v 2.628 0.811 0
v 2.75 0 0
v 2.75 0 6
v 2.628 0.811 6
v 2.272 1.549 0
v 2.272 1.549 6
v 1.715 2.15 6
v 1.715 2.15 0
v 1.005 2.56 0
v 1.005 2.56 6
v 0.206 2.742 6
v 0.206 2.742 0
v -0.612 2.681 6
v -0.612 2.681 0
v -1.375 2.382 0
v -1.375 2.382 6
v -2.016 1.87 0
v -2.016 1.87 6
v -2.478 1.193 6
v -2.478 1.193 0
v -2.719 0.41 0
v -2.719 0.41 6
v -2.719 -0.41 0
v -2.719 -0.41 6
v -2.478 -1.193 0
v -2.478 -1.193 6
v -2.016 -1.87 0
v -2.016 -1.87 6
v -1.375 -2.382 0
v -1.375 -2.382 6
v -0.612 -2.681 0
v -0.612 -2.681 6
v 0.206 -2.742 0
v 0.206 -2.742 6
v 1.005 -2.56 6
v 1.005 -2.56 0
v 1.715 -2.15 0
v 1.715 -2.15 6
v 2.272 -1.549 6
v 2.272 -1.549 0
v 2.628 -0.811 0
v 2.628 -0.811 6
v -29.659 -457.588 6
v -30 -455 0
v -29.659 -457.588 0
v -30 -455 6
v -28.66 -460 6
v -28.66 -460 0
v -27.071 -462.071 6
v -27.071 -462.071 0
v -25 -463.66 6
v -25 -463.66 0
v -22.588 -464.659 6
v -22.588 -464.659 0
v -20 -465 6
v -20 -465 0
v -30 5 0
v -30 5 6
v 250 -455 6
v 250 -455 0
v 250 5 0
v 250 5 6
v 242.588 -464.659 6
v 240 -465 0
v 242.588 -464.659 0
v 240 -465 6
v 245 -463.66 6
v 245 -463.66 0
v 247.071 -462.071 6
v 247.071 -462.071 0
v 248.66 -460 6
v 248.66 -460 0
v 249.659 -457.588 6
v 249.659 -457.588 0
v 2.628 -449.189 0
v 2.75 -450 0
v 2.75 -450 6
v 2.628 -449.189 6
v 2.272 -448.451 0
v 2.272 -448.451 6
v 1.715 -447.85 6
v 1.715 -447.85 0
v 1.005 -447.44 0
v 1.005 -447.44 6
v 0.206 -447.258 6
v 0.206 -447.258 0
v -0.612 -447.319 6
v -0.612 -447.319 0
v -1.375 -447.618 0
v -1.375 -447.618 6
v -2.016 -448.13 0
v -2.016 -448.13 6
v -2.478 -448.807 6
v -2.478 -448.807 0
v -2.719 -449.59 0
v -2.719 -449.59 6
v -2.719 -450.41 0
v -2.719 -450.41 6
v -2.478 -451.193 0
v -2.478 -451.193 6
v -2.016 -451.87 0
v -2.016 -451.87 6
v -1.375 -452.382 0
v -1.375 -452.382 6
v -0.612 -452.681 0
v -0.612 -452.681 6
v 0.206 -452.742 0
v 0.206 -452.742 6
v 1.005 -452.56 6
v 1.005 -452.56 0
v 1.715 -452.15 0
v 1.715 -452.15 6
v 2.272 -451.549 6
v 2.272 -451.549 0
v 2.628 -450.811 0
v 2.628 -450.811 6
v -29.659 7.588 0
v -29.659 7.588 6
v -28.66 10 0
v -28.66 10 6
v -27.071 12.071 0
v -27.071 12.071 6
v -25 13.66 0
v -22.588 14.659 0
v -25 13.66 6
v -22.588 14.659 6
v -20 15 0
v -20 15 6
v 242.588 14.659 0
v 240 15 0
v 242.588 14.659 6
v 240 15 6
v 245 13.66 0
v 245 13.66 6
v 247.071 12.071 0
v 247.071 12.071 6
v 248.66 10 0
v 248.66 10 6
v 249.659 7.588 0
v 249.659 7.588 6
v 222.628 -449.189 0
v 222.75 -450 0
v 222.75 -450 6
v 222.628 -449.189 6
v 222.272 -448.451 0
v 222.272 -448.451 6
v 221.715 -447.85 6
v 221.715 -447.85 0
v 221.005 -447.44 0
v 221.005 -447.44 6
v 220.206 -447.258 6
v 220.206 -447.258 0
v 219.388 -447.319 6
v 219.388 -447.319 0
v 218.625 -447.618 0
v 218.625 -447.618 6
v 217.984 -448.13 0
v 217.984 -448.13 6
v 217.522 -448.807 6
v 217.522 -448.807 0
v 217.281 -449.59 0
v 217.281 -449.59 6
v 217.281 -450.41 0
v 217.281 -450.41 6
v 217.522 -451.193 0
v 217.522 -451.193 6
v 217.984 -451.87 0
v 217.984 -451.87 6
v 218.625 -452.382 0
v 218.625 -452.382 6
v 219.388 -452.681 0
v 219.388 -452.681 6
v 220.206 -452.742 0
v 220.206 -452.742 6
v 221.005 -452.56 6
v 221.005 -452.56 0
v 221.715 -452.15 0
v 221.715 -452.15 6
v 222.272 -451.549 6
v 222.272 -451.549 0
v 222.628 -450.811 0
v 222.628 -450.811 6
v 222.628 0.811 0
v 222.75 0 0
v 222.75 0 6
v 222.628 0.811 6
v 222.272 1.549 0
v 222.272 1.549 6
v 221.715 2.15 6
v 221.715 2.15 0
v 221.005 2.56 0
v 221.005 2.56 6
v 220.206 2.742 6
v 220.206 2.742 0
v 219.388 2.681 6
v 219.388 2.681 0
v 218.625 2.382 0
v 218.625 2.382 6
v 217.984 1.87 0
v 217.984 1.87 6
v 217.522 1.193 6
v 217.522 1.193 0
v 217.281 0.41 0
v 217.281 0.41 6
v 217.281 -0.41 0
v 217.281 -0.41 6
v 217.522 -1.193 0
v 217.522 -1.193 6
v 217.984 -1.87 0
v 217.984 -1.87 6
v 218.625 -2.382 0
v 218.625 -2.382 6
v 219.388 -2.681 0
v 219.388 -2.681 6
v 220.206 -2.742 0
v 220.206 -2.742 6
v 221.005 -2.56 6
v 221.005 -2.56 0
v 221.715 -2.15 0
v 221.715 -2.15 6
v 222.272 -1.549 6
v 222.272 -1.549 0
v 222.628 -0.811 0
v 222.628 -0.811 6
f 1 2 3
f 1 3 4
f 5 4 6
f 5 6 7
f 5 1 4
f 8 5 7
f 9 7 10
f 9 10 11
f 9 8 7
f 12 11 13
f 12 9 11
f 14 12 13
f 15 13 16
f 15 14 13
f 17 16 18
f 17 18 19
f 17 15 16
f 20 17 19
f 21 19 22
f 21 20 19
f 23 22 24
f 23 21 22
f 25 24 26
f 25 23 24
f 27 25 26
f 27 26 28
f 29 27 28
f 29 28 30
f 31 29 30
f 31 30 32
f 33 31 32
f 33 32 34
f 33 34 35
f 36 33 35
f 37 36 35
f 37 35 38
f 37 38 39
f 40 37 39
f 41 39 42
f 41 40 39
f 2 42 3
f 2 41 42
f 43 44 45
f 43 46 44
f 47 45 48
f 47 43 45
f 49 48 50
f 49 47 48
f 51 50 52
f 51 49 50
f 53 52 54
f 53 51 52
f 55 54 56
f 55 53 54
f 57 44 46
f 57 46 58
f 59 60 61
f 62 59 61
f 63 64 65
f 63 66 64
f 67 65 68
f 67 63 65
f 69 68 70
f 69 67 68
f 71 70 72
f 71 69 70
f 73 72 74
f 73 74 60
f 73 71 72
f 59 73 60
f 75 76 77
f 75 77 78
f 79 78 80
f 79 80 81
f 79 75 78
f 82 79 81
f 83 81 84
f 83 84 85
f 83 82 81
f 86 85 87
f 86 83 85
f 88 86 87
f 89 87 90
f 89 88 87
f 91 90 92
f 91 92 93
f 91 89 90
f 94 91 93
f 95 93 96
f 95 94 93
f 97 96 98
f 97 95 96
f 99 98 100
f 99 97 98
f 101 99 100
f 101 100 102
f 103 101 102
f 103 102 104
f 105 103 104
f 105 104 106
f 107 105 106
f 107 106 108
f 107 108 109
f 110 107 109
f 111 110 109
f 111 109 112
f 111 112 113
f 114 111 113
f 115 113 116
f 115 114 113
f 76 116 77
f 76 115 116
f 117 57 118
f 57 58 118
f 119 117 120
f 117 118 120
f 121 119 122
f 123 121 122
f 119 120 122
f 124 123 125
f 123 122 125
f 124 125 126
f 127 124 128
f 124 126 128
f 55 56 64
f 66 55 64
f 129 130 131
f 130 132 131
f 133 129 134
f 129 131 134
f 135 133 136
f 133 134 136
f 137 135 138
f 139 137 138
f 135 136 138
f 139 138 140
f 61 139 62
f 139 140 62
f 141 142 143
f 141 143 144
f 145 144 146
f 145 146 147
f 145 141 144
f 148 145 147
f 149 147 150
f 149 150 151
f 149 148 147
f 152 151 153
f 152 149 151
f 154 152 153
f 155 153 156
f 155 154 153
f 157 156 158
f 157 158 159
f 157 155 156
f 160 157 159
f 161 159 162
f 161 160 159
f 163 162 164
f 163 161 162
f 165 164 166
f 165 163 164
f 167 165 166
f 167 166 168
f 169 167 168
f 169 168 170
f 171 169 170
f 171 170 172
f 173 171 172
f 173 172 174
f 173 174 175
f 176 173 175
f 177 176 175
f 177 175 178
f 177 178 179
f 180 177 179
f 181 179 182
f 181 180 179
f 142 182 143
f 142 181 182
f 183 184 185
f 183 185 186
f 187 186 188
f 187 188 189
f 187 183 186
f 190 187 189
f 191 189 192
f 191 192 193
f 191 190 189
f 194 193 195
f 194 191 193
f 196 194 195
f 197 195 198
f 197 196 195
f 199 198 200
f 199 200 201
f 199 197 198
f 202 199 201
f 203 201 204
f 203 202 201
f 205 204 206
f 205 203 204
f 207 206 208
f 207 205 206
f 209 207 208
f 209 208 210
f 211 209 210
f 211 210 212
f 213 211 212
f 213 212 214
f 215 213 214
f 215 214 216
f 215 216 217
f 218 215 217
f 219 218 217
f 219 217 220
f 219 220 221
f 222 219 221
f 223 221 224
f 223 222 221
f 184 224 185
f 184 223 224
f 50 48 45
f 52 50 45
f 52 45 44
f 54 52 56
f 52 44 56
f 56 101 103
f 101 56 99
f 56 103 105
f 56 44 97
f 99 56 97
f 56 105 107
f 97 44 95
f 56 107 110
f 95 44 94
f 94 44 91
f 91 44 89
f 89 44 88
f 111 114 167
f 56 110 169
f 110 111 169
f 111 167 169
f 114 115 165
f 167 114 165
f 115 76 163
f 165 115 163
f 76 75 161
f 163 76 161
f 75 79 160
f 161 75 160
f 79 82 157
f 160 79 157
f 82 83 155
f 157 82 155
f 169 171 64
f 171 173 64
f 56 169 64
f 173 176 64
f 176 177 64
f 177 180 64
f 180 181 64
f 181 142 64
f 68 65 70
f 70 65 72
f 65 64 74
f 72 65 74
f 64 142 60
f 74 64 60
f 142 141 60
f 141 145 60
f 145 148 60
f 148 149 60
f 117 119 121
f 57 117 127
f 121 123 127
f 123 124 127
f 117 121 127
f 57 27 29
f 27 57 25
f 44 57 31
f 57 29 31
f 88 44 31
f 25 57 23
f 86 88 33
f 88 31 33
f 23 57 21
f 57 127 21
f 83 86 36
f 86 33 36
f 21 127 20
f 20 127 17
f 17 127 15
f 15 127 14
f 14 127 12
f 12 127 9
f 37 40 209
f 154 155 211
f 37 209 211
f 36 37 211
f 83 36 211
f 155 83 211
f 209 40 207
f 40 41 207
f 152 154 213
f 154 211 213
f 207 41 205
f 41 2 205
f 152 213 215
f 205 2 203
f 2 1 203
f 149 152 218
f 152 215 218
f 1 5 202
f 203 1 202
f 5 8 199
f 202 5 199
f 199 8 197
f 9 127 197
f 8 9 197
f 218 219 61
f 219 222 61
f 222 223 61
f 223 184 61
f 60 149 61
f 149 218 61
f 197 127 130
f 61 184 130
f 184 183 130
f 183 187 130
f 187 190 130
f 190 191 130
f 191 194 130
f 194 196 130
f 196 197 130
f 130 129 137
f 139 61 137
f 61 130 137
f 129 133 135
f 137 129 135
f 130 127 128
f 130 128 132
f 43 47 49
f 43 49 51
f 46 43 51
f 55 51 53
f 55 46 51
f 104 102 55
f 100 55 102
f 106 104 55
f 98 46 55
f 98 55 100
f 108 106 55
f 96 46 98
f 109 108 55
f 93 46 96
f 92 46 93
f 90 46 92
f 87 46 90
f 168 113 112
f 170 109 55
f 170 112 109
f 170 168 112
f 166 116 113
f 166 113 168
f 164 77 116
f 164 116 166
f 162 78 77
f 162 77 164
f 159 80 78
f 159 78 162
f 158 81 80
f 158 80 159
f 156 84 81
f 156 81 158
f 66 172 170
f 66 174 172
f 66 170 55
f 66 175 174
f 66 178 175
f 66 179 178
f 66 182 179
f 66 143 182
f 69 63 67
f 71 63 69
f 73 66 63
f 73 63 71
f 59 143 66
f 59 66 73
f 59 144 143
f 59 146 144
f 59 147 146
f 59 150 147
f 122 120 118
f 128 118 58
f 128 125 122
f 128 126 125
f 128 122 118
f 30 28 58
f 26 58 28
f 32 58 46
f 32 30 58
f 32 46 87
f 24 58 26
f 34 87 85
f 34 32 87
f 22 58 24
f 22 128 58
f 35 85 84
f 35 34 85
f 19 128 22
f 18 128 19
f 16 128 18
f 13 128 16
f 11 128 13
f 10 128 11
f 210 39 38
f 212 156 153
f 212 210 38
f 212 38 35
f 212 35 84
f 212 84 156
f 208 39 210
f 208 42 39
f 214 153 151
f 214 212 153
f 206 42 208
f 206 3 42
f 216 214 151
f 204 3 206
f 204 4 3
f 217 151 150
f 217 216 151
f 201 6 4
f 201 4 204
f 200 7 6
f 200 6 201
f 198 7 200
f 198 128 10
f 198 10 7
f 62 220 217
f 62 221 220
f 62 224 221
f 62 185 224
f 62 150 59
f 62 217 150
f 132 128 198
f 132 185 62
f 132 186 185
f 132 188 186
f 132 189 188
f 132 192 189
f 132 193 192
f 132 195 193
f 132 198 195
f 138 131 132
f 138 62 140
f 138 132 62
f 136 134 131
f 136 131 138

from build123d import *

# Parameters (mm, degrees)
SKETCH_1_W      = 280
SKETCH_1_H      = 480
SKETCH_1_R      = 2.75
EXTRUDE_1_DEPTH = 6
FILLET_1_R      = 10


with BuildPart() as part:
    # 草图1 → 凸台-拉伸1 (new body)
    with BuildSketch(Plane.XY):
        with Locations((110, -225)):
            Rectangle(SKETCH_1_W, SKETCH_1_H)
        Circle(SKETCH_1_R, mode=Mode.SUBTRACT)
        with Locations((220, 0)):
            Circle(SKETCH_1_R, mode=Mode.SUBTRACT)
        with Locations((220, -450)):
            Circle(SKETCH_1_R, mode=Mode.SUBTRACT)
        with Locations((0, -450)):
            Circle(SKETCH_1_R, mode=Mode.SUBTRACT)
    extrude(amount=EXTRUDE_1_DEPTH)

    # 圆角1
    fillet_1_edges = [part.edges().sort_by_distance(p)[0] for p in [
        (250, 15, 3),
        (250, -465, 3),
        (-30, -465, 3),
        (-30, 15, 3),
    ]]
    fillet(fillet_1_edges, radius=FILLET_1_R)


solid = part.part
